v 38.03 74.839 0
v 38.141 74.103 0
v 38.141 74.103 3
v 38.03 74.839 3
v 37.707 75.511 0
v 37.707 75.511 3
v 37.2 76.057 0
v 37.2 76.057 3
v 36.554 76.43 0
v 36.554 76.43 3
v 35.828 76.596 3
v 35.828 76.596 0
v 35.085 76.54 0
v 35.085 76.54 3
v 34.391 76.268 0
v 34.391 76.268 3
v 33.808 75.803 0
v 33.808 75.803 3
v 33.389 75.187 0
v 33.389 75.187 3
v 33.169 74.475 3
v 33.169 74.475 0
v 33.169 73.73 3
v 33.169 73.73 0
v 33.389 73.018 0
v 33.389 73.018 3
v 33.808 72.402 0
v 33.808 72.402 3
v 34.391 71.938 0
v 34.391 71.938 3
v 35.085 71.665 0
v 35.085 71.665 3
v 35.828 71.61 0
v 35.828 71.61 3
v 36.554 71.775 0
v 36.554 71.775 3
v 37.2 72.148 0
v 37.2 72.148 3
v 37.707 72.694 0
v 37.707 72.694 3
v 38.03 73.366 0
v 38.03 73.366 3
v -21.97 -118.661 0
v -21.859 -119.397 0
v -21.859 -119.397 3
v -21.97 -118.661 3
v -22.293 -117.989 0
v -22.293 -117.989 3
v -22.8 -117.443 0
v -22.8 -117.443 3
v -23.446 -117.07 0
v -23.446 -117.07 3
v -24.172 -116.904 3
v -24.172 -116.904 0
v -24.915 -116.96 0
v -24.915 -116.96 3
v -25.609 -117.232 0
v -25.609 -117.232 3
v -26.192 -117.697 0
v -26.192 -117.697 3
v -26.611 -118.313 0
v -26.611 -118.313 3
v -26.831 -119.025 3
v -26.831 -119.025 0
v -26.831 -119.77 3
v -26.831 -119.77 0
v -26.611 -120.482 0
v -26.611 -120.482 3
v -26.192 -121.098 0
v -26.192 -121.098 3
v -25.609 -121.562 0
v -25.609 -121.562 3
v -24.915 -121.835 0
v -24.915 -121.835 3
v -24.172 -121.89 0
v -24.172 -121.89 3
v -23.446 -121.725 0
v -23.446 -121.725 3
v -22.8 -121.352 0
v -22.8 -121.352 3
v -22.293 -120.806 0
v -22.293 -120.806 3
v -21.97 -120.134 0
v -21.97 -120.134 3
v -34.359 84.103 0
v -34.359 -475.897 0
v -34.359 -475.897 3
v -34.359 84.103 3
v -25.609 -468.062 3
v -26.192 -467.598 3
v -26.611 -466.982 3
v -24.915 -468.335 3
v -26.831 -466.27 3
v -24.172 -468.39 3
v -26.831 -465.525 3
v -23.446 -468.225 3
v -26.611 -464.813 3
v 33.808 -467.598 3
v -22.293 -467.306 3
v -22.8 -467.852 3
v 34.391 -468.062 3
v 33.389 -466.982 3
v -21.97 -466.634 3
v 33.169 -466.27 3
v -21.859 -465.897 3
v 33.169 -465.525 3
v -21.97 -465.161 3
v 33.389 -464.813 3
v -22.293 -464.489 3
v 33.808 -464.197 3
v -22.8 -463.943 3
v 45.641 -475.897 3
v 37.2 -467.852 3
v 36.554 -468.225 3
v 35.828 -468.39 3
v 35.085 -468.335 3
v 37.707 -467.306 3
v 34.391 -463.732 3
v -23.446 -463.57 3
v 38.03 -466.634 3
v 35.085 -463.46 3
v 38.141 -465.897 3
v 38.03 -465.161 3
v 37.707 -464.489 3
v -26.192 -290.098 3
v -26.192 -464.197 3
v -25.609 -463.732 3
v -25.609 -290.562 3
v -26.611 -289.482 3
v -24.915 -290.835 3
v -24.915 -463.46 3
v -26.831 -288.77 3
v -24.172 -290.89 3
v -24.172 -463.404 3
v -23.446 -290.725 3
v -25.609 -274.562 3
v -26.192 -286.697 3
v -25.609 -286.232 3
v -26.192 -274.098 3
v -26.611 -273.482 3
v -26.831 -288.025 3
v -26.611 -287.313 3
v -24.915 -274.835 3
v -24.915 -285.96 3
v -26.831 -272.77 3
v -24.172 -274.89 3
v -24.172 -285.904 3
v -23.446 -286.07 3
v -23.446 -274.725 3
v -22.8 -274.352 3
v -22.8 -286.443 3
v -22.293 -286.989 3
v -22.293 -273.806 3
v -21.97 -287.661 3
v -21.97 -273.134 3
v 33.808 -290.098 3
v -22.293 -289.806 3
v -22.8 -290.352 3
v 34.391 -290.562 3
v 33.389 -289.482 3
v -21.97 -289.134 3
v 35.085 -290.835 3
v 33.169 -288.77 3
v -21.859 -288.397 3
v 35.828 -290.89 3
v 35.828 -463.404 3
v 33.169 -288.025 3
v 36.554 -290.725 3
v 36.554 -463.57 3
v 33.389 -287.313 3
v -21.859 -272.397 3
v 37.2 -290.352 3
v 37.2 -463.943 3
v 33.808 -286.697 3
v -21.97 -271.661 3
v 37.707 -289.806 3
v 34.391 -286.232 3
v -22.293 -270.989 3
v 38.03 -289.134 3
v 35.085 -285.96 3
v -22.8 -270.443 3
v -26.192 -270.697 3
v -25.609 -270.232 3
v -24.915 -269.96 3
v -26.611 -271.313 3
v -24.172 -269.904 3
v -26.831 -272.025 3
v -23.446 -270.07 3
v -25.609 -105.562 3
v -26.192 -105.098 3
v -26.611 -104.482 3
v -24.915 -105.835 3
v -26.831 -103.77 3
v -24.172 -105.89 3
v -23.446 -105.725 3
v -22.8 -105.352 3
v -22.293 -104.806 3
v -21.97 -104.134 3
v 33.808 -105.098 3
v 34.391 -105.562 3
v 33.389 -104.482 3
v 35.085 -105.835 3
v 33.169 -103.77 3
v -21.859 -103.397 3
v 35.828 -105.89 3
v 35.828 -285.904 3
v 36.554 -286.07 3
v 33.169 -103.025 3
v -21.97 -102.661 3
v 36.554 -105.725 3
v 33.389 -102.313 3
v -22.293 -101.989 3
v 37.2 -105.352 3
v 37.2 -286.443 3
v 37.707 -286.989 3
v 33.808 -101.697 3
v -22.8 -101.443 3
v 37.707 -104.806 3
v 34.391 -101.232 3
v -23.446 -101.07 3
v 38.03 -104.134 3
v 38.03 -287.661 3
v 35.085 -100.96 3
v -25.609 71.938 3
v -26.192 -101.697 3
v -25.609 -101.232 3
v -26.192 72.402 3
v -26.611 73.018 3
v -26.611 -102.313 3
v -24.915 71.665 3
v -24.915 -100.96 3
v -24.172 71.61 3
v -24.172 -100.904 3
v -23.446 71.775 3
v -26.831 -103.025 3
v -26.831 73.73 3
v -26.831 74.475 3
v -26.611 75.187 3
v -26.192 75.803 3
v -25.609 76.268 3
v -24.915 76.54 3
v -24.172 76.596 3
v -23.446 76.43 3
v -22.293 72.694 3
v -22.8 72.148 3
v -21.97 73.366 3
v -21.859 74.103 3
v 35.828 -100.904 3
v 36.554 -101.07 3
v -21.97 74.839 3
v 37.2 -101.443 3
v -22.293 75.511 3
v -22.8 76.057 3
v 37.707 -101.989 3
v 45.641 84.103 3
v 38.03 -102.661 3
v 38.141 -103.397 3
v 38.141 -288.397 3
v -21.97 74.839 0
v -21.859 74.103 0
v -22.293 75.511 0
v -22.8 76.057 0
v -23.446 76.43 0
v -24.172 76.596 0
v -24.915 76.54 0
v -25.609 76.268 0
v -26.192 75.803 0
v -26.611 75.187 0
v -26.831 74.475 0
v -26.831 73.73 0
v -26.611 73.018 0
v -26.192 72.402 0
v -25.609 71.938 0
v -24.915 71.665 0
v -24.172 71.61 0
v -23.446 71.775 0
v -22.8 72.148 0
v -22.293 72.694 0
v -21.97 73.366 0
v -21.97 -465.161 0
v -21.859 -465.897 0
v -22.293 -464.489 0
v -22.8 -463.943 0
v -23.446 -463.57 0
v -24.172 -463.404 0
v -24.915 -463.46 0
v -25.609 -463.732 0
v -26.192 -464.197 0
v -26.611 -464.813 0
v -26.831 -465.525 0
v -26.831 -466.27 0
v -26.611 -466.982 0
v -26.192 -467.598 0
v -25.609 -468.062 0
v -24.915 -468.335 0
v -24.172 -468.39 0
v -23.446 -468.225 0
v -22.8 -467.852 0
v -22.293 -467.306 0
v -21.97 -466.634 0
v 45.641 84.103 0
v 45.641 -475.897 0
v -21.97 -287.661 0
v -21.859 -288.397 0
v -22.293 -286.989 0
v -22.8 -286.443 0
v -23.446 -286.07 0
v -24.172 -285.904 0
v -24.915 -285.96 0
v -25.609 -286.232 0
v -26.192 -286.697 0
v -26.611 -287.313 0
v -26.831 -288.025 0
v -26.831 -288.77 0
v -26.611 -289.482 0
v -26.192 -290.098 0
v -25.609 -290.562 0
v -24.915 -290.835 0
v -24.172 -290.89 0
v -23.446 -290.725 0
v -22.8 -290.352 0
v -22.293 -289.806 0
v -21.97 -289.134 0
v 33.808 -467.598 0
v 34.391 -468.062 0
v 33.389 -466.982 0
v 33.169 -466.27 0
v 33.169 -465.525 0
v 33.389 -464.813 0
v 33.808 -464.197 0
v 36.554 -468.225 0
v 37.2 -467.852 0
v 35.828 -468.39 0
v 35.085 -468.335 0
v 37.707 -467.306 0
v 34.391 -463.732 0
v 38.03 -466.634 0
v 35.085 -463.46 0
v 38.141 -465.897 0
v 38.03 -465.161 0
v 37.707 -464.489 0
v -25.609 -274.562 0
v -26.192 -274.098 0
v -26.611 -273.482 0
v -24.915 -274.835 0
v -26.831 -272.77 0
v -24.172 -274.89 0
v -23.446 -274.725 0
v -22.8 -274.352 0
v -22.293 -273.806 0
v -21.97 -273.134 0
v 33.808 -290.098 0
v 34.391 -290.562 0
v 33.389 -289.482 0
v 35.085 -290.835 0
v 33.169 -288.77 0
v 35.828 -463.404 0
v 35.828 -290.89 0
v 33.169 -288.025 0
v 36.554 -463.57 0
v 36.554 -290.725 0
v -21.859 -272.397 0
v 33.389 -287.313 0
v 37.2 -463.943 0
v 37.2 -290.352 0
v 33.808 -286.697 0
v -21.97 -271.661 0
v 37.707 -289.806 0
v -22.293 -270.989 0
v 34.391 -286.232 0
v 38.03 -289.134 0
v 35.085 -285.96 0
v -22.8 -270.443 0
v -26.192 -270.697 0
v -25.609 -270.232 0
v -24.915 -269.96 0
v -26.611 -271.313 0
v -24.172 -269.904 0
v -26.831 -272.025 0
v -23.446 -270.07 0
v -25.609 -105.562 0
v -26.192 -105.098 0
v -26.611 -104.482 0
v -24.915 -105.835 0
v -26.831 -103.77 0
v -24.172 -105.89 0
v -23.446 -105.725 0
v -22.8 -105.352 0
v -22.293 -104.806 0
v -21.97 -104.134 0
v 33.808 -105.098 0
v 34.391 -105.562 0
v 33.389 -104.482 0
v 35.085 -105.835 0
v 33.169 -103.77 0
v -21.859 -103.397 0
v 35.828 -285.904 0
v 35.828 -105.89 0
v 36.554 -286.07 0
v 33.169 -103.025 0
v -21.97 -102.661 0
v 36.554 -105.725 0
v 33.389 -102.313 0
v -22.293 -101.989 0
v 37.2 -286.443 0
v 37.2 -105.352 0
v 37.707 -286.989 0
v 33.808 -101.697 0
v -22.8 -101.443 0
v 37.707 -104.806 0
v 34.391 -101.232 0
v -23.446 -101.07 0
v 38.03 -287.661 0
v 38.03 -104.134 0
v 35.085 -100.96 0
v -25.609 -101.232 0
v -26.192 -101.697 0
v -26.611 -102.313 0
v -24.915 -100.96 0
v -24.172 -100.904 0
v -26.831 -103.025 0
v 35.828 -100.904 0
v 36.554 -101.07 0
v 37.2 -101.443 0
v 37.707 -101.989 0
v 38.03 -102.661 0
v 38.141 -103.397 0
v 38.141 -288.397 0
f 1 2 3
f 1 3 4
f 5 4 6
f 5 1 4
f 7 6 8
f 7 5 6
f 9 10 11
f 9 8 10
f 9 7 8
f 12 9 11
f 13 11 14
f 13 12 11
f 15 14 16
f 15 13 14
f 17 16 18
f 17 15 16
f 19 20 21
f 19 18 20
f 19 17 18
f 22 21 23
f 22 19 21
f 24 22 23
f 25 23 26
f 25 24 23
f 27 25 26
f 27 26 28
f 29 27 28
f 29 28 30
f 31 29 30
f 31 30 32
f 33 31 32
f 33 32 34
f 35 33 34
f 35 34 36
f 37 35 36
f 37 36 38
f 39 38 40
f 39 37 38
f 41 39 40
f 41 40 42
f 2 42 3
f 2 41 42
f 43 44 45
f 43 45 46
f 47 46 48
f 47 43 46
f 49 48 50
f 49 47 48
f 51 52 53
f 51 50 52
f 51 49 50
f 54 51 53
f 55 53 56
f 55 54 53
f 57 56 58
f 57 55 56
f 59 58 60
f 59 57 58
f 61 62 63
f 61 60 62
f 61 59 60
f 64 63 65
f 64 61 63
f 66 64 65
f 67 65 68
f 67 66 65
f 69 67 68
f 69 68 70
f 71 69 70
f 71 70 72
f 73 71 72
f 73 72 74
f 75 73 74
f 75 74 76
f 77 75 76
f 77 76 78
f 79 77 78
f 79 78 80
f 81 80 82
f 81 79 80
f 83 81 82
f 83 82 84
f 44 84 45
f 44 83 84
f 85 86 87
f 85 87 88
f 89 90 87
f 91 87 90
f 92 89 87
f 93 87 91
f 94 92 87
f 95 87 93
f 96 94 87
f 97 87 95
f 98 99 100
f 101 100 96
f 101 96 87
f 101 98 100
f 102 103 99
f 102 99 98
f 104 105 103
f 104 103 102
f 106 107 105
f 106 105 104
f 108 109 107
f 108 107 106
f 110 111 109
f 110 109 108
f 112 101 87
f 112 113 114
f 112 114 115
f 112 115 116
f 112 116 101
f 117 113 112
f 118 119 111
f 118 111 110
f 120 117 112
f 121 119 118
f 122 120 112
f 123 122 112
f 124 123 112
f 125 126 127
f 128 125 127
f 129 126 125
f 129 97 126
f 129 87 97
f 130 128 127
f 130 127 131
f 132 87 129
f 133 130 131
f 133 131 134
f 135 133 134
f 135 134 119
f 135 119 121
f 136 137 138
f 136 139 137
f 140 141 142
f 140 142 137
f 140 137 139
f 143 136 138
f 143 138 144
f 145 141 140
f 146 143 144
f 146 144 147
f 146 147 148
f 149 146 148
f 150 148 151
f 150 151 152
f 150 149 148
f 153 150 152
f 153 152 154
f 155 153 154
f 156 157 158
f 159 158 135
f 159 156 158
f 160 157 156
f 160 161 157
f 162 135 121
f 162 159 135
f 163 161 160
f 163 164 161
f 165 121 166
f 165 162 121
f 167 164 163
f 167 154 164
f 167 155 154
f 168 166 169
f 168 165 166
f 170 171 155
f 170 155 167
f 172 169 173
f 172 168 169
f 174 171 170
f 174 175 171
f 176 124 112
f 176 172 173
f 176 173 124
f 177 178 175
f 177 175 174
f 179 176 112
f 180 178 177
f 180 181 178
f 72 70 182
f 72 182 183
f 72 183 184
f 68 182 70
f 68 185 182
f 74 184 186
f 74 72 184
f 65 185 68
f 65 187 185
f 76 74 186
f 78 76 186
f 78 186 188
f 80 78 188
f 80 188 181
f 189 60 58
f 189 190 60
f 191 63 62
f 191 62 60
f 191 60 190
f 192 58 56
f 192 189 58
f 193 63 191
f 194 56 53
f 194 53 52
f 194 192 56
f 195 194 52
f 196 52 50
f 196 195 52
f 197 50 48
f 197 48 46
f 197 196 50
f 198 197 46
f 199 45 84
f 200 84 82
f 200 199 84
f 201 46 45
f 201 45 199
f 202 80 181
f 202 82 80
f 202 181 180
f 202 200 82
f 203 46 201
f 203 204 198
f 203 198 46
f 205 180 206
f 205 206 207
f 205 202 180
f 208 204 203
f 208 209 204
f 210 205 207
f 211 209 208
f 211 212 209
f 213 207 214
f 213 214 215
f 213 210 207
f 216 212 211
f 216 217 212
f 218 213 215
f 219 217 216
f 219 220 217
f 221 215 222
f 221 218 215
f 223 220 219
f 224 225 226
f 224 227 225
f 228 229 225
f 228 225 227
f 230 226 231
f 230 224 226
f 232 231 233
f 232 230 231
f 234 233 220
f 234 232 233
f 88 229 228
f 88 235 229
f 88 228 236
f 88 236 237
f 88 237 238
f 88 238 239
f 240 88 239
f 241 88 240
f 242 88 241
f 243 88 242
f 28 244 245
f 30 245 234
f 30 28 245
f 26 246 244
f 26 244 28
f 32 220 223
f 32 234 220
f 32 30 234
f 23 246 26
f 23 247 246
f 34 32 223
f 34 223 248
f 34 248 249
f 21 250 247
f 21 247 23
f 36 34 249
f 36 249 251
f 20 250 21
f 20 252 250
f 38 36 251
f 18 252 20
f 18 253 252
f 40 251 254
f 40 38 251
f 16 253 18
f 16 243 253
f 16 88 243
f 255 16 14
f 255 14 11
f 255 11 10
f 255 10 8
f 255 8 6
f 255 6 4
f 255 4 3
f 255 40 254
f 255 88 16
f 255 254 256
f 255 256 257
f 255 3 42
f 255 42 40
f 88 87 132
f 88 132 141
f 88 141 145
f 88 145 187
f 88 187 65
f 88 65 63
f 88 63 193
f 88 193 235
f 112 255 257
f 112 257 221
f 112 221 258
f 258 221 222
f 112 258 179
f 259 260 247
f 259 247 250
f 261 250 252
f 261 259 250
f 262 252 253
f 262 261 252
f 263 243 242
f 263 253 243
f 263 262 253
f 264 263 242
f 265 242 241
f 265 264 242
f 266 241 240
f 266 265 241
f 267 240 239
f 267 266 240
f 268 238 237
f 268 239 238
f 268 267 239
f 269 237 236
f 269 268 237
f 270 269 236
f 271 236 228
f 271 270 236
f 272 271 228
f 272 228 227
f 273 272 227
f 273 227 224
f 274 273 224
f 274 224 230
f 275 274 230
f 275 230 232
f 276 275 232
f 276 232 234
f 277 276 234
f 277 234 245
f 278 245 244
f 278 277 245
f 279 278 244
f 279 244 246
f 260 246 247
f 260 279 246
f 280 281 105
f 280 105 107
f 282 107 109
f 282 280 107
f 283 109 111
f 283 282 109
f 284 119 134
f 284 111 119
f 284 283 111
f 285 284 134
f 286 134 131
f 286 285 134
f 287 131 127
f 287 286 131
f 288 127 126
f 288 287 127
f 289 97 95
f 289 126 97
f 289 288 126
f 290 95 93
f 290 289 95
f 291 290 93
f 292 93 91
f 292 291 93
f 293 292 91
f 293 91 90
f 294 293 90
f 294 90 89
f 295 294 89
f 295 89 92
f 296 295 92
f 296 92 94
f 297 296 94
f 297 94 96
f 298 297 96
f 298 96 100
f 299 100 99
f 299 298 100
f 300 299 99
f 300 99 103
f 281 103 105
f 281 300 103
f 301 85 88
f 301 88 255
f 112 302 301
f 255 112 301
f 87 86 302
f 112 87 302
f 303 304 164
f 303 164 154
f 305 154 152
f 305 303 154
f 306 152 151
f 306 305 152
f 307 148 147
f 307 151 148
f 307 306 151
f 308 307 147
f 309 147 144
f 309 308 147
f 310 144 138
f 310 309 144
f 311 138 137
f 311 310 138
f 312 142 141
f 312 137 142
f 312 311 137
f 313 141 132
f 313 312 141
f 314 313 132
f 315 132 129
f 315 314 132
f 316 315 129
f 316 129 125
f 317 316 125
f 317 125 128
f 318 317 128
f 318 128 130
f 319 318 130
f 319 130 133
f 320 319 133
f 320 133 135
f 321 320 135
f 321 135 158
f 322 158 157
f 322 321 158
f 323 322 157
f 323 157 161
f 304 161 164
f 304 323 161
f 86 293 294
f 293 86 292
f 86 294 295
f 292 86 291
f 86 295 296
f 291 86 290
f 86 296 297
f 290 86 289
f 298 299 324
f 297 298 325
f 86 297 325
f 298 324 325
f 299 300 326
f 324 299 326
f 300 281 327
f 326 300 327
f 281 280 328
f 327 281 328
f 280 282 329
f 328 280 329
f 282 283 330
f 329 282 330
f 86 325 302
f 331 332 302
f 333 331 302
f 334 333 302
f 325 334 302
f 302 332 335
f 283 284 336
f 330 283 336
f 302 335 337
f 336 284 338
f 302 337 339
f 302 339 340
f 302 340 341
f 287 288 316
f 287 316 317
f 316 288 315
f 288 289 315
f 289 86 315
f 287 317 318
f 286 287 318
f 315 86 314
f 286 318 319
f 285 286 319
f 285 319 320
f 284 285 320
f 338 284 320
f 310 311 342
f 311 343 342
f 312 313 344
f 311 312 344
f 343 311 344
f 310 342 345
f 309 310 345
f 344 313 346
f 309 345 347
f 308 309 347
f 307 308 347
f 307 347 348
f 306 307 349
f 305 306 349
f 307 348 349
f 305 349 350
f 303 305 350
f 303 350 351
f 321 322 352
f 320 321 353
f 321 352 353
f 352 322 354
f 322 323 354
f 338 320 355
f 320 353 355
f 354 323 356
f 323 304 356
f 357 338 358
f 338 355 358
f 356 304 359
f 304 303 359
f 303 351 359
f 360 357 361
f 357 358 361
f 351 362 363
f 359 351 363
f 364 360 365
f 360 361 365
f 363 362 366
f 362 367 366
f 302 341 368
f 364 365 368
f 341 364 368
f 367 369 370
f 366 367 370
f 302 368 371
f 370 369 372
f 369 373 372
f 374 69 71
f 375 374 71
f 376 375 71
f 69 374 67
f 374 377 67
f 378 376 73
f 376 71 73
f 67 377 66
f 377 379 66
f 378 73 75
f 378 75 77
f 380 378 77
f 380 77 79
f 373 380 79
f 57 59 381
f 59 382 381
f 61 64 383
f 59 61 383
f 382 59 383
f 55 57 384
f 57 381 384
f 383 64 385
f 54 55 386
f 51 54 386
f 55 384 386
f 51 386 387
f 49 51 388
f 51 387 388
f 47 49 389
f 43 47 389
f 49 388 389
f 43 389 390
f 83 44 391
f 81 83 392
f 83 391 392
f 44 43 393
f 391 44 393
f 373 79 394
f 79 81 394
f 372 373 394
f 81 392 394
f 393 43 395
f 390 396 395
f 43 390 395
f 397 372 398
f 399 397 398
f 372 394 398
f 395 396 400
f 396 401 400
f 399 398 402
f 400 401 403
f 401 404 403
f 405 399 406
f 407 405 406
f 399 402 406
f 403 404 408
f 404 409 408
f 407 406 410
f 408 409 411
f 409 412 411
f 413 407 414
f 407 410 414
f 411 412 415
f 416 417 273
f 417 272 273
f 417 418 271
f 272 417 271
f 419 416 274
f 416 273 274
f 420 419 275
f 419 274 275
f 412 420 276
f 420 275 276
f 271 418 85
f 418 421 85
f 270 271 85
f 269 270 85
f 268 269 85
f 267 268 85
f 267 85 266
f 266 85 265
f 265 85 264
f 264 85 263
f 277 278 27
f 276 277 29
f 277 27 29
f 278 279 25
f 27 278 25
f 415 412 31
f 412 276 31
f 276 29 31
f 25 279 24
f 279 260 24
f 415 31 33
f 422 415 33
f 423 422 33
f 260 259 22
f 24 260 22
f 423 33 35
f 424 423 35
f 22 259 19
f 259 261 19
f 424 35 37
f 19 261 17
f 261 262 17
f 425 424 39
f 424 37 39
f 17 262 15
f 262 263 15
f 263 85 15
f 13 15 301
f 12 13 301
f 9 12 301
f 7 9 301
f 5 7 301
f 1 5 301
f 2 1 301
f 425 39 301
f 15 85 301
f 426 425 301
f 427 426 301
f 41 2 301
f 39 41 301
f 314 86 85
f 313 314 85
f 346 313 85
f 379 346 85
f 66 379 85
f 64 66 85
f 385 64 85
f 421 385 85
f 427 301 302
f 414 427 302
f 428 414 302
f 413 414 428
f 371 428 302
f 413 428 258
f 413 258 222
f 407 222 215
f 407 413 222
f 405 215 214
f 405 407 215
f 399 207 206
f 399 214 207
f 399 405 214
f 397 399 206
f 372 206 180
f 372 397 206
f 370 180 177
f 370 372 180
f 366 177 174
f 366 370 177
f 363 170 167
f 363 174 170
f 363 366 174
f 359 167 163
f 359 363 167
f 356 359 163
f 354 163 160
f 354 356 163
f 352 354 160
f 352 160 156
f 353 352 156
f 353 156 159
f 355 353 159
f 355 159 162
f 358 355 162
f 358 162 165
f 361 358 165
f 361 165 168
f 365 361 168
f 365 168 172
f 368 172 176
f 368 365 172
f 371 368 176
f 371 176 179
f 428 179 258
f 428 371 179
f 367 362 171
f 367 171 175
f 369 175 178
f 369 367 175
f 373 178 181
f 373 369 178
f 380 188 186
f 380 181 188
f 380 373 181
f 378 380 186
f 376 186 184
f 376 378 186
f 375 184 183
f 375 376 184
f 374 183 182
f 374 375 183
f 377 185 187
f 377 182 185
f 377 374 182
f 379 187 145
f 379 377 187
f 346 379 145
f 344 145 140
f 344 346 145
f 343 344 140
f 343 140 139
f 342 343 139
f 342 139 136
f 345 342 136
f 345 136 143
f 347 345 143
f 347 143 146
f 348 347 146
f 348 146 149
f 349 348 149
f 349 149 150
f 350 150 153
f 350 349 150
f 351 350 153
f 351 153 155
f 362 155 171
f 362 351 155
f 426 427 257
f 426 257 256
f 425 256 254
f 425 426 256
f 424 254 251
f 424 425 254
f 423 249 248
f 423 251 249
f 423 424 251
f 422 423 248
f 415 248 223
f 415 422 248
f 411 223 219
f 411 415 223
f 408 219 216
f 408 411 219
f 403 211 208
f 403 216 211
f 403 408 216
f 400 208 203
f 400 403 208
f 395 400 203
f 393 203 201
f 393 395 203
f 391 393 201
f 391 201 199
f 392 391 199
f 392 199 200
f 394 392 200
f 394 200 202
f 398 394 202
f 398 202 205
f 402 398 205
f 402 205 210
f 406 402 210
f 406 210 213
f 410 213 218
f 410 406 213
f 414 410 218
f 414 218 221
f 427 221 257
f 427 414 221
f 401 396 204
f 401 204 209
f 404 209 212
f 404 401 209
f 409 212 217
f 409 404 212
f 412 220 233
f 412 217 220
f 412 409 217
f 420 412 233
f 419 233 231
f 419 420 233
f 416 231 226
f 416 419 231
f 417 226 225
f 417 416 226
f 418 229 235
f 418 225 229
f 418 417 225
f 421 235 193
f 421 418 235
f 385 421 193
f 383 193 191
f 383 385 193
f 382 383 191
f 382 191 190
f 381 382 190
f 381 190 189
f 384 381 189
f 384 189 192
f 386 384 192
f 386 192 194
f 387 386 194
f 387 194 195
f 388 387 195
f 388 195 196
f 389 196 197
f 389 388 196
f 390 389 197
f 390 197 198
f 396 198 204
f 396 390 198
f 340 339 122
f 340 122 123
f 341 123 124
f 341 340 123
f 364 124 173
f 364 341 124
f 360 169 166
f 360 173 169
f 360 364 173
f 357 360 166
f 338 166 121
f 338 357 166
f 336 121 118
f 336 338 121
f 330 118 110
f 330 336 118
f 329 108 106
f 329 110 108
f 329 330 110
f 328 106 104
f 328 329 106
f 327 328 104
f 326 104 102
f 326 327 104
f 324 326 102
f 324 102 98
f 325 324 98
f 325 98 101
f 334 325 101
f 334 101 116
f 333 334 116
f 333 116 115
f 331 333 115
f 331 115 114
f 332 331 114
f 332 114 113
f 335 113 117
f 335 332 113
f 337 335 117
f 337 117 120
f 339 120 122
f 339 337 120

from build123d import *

# Parameters (mm, degrees)
SKETCH1_W               = 80
SKETCH1_H               = 560
BOSS_EXTRUDE1_DEPTH     = 3
CUT_EXTRUDE1_DEPTH      = 479.090444074
CUT_EXTRUDE1_DEPTH_BACK = 479.090444074
SKETCH2_R               = 2.5


with BuildPart() as part:
    # Sketch1 → Boss-Extrude1 (new body)
    with BuildSketch(Plane.XY):
        with Locations((5.641025641, -195.897435897)):
            Rectangle(SKETCH1_W, SKETCH1_H)
    extrude(amount=BOSS_EXTRUDE1_DEPTH)

    # Sketch2 → Cut-Extrude1 (cut, two sides: drawn at the far end of the back side and taken through both)
    with BuildSketch(Plane.XY.offset(3).offset(-CUT_EXTRUDE1_DEPTH_BACK)):
        with Locations((-24.358974359, 74.102564103)):
            Circle(SKETCH2_R)
        with Locations((35.641025641, 74.102564103)):
            Circle(SKETCH2_R)
        with Locations((-24.358974359, -465.897435897)):
            Circle(SKETCH2_R)
        with Locations((35.641025641, -465.897435897)):
            Circle(SKETCH2_R)
        with Locations((-24.358974359, -103.397435897)):
            Circle(SKETCH2_R)
        with Locations((-24.358974359, -288.397435897)):
            Circle(SKETCH2_R)
        with Locations((-24.358974359, -272.397435897)):
            Circle(SKETCH2_R)
        with Locations((-24.358974359, -119.397435897)):
            Circle(SKETCH2_R)
        with Locations((35.641025641, -103.397435897)):
            Circle(SKETCH2_R)
        with Locations((35.641025641, -288.397435897)):
            Circle(SKETCH2_R)
    extrude(amount=CUT_EXTRUDE1_DEPTH + CUT_EXTRUDE1_DEPTH_BACK, mode=Mode.SUBTRACT)


solid = part.part
